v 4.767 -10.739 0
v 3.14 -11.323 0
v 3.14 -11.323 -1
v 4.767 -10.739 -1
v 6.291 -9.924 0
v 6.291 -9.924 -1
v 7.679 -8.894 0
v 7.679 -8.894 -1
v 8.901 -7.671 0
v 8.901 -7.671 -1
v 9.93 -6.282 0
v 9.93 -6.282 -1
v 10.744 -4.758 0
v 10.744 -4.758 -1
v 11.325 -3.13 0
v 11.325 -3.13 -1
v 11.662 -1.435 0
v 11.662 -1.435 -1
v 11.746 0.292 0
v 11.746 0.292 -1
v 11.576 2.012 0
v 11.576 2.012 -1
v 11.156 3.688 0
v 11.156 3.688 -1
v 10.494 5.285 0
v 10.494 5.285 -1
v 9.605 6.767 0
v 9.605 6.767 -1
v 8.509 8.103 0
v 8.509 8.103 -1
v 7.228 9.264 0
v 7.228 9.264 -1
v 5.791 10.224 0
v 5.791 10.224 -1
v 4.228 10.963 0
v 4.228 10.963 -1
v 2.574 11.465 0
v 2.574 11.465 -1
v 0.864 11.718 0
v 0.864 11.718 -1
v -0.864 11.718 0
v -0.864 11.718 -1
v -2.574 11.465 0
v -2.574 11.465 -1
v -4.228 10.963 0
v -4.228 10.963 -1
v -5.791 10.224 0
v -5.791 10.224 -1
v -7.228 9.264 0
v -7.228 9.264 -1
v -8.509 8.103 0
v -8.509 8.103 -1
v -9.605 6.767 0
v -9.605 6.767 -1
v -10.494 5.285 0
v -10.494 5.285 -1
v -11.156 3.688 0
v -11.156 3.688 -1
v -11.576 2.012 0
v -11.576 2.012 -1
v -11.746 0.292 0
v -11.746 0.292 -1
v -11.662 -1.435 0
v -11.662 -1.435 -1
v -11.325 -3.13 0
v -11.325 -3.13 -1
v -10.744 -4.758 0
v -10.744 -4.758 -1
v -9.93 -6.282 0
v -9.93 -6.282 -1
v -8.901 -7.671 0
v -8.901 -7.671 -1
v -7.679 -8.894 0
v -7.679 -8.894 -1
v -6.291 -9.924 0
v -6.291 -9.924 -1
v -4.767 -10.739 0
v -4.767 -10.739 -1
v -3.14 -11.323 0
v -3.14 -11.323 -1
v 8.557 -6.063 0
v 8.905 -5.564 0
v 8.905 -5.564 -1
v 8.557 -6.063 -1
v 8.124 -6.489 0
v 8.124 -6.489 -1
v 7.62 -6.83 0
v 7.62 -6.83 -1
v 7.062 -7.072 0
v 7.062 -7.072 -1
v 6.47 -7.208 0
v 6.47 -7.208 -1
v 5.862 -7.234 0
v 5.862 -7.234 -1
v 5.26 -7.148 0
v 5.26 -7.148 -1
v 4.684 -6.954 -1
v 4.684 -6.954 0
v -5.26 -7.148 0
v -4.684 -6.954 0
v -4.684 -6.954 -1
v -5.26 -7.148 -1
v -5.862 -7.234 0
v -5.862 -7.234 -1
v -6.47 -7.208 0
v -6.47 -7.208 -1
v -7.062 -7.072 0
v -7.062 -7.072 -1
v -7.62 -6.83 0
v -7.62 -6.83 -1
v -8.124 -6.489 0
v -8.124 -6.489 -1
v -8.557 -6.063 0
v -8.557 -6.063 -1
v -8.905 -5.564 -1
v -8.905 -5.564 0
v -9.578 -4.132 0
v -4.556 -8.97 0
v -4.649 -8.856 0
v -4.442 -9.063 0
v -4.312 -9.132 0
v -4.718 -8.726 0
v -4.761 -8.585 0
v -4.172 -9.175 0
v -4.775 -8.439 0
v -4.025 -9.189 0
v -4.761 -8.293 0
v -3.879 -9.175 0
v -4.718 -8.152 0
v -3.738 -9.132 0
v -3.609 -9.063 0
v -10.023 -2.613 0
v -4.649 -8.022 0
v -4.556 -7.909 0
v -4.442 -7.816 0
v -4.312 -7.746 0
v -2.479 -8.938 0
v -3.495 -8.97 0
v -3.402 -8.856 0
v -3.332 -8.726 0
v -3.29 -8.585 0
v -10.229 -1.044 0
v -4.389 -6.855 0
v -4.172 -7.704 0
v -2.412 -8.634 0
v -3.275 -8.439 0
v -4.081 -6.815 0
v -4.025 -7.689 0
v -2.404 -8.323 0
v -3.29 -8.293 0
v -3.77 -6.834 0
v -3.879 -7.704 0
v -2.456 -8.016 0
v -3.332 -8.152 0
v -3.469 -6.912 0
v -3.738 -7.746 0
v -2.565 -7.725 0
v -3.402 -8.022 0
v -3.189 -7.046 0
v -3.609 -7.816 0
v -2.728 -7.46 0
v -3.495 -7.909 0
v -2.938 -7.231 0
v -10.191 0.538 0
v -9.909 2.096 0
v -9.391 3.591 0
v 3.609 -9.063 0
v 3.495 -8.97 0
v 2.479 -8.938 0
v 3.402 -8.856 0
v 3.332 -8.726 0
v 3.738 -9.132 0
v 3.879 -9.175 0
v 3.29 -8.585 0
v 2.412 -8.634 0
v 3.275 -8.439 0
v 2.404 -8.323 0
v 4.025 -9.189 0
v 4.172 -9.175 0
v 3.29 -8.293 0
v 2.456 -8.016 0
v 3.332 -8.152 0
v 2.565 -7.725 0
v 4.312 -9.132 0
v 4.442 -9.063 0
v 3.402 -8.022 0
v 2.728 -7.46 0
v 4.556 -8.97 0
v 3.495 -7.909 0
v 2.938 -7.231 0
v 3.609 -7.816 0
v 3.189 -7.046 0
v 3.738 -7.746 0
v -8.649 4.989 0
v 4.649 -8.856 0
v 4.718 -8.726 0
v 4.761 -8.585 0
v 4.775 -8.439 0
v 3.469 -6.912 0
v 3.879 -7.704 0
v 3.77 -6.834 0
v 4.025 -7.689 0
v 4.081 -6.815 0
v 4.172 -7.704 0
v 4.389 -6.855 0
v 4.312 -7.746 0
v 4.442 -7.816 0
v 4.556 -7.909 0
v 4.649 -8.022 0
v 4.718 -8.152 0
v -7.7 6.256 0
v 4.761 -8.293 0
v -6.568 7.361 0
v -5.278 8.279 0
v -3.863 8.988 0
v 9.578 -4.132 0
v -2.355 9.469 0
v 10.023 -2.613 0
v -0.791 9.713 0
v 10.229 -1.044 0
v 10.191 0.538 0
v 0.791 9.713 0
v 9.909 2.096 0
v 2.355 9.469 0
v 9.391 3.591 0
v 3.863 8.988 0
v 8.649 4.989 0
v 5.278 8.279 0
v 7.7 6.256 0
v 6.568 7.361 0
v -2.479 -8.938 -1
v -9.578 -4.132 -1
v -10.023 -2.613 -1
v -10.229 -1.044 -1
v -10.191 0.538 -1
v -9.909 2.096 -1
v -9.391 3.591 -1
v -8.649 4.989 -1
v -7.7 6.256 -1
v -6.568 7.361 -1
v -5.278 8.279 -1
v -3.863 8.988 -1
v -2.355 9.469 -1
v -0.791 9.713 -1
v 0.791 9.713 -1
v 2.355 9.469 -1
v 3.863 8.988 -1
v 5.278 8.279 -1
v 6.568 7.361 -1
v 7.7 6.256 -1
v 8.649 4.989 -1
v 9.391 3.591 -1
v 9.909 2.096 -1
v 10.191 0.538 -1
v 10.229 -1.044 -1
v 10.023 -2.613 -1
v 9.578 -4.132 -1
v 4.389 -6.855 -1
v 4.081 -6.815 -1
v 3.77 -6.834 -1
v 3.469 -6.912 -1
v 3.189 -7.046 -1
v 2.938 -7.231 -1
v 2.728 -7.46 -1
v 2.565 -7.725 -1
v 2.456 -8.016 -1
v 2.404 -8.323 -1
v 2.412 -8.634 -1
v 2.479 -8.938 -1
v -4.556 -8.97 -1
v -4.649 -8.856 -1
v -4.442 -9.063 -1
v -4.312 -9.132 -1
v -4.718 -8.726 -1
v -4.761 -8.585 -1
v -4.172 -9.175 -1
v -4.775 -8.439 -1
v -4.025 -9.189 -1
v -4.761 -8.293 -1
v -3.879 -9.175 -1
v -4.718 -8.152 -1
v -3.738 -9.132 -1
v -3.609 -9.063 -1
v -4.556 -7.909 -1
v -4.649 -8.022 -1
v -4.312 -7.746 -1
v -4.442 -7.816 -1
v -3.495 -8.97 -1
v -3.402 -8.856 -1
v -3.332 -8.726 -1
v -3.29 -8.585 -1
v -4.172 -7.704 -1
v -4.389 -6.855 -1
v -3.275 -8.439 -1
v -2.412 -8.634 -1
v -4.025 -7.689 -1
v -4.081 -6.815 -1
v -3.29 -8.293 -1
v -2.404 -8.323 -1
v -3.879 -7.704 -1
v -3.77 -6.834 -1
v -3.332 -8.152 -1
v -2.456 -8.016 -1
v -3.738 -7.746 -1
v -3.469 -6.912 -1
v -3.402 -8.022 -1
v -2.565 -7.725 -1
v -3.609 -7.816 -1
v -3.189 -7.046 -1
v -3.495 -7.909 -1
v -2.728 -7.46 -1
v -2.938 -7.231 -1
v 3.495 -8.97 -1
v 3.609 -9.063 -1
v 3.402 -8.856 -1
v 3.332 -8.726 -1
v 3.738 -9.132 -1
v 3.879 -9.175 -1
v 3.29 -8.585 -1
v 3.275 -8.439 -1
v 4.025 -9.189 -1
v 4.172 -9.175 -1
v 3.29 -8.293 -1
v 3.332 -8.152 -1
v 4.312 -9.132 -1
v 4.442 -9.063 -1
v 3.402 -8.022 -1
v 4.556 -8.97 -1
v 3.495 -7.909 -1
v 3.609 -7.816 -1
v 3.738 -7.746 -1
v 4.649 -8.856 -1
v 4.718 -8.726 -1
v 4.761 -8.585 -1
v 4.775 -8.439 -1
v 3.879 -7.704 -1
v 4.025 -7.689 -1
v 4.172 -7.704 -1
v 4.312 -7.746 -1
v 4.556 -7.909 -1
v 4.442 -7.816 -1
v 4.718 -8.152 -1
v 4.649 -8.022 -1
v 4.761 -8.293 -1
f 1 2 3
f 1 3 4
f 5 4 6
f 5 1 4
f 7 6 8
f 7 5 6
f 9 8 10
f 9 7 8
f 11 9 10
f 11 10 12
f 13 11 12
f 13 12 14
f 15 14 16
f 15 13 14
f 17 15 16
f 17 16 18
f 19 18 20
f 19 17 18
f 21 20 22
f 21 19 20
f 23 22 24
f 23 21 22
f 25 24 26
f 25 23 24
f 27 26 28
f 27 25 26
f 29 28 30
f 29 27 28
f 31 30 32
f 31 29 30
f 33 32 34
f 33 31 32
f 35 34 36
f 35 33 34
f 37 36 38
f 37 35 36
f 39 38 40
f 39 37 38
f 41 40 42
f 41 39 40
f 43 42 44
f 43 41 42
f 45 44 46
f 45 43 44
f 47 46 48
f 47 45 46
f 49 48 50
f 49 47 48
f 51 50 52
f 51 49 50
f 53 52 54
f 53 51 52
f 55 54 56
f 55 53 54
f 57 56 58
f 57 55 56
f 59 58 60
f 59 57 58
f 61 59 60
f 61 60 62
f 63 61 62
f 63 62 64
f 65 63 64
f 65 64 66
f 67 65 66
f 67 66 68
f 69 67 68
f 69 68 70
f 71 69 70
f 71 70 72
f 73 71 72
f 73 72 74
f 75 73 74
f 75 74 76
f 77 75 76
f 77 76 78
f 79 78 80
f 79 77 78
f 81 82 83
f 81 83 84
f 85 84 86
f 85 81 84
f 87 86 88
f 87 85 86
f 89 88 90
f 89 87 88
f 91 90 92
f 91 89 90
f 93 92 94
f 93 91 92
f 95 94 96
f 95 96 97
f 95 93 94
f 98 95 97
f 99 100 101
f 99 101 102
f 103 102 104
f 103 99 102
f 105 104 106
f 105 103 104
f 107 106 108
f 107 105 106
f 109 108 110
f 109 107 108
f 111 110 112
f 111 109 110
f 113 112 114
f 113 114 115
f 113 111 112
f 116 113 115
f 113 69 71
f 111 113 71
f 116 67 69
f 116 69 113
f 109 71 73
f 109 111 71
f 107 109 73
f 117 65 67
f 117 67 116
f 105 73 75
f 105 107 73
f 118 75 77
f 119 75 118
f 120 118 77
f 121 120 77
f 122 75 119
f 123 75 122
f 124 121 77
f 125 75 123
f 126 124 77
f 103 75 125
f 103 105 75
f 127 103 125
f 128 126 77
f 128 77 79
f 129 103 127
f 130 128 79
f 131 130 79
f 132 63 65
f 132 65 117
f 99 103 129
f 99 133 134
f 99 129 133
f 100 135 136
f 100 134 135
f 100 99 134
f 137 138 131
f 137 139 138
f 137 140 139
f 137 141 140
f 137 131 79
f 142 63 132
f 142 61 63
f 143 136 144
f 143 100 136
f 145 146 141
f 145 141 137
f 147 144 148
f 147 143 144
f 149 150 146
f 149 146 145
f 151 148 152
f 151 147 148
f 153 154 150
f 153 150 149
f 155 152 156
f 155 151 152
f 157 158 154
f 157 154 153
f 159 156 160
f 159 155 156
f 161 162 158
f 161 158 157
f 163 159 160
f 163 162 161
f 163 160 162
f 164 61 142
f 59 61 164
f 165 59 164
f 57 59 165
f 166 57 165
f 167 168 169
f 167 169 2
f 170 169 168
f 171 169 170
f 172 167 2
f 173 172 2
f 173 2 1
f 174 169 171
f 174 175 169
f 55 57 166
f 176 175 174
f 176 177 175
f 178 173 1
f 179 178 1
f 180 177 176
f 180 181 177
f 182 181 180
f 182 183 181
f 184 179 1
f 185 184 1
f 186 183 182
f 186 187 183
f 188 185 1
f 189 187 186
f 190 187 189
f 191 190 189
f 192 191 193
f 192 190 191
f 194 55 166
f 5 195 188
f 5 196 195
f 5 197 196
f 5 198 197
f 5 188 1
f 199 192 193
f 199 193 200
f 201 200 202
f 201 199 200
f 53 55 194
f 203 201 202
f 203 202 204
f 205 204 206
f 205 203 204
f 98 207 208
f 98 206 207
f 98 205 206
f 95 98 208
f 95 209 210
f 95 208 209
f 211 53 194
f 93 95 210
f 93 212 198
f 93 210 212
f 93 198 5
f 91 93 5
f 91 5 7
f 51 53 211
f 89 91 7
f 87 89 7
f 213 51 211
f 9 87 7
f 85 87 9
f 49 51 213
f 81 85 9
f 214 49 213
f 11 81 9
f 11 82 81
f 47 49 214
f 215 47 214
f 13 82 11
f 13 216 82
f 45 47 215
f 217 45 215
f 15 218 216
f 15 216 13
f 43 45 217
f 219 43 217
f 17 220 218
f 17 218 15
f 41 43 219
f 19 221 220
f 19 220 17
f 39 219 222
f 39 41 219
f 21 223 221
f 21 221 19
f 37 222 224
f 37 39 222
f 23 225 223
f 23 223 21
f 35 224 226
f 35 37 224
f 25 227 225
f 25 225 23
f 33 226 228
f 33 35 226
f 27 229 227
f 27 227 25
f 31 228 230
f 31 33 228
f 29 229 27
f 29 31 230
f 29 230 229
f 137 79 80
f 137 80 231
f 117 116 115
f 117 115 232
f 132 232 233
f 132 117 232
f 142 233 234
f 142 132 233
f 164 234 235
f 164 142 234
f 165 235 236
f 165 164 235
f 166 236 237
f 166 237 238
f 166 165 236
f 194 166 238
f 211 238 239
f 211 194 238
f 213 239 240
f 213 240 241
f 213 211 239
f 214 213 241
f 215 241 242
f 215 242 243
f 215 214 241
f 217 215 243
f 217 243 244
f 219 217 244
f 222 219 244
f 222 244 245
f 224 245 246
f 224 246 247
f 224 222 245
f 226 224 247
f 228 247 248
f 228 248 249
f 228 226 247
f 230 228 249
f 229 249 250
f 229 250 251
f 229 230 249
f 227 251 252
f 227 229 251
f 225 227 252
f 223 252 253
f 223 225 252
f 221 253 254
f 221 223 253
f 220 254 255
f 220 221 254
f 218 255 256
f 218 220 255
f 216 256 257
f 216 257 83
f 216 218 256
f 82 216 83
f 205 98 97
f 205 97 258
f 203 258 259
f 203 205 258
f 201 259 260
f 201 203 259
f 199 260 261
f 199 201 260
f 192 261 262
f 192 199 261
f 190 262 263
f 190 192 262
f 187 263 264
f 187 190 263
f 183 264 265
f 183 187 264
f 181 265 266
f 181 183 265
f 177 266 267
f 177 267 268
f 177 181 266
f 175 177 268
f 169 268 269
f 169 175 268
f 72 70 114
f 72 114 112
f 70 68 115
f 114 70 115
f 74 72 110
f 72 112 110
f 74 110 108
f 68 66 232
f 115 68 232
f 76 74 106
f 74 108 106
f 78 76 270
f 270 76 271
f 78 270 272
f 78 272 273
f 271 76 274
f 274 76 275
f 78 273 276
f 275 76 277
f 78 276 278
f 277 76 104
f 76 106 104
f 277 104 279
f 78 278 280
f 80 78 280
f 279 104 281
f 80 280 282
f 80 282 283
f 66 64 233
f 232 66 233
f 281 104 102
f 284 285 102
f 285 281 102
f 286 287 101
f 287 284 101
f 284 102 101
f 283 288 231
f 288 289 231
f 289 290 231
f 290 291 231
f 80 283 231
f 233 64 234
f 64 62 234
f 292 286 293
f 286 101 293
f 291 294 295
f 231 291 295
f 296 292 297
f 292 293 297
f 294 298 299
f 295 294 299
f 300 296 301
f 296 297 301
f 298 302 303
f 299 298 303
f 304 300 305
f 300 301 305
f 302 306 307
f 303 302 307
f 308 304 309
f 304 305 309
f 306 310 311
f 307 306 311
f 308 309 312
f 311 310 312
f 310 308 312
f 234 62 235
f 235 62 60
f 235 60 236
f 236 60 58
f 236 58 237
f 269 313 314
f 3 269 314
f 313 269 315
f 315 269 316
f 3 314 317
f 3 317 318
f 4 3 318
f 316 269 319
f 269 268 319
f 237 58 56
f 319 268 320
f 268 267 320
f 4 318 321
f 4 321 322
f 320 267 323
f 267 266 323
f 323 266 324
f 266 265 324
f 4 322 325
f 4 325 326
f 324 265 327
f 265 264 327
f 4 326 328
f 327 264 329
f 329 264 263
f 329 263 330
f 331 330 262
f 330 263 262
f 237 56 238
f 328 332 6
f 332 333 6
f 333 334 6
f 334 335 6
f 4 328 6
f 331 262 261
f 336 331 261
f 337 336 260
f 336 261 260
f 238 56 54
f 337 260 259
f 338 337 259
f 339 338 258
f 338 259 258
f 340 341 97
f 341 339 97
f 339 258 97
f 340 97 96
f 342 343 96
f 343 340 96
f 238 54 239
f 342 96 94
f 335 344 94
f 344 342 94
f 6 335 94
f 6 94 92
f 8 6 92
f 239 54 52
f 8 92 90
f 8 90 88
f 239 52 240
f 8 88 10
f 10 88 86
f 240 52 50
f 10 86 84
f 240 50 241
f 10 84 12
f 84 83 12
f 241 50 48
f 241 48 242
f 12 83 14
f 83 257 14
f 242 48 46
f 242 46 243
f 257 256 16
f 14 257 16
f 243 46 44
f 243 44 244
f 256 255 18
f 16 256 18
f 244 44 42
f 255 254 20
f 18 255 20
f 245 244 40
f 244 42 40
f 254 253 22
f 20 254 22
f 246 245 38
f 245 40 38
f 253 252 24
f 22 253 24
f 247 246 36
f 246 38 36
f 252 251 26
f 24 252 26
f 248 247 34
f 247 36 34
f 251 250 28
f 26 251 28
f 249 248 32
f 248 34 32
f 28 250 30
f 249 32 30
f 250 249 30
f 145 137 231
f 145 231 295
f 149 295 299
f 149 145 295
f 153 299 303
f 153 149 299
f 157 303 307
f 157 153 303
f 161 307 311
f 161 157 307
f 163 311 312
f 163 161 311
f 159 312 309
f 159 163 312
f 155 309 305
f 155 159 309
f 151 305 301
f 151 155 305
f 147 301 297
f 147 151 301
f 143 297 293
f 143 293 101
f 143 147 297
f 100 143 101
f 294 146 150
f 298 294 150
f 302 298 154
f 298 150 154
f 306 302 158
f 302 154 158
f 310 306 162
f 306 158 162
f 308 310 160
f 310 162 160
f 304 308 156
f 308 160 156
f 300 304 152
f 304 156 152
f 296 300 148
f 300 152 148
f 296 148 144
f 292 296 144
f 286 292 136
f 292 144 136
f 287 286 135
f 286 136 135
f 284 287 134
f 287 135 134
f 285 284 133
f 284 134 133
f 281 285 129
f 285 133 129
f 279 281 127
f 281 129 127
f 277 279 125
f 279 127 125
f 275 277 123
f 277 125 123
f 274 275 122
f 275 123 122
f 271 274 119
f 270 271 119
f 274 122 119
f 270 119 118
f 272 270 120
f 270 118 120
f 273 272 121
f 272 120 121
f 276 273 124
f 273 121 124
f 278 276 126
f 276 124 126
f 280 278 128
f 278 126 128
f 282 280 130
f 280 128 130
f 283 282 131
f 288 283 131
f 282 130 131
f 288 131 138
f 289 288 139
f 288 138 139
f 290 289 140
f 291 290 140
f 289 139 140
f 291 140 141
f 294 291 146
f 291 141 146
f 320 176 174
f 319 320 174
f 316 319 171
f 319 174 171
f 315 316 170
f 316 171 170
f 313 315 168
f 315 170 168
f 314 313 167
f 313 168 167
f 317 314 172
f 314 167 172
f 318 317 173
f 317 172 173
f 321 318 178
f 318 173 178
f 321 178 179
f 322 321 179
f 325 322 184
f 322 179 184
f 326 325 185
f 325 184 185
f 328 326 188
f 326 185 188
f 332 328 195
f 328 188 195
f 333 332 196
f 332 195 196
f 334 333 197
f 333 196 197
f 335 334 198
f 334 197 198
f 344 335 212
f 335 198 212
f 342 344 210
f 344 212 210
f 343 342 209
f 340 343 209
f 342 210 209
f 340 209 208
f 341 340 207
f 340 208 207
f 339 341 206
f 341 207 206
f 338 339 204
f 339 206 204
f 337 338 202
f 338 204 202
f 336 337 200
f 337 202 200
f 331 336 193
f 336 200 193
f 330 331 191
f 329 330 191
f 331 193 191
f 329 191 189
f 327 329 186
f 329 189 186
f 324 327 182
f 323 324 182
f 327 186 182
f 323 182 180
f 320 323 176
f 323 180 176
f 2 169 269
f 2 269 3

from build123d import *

# Parameters (mm, degrees)
SKETCH1_R          = 0.75
BASE_FLANGE1_DEPTH = 1


# Sheet-metal steps are written as plain solids
with BuildPart() as part:
    # Sketch1 → Base-Flange1 (new body)
    with BuildSketch(Plane.XY):
        with BuildLine():
            Line((-3.140050919, -11.322657825), (-2.47867317, -8.937806709))
            ThreePointArc((-2.47867317, -8.937806709), (-2.938495148, -7.231063808), (-4.684207754, -6.95376419))
            ThreePointArc((-4.684207754, -6.95376419), (-7.062092174, -7.07208067), (-8.90450501, -5.564152274))
            ThreePointArc((-8.90450501, -5.564152274), (0, 9.743819977), (8.90450501, -5.564152274))
            ThreePointArc((8.90450501, -5.564152274), (7.062092174, -7.07208067), (4.684207754, -6.95376419))
            ThreePointArc((4.684207754, -6.95376419), (2.938495148, -7.231063808), (2.47867317, -8.937806709))
            Line((2.47867317, -8.937806709), (3.140050919, -11.322657825))
            ThreePointArc((3.140050919, -11.322657825), (0, 11.75), (-3.140050919, -11.322657825))
        make_face()
        with Locations((-4.025278755, -8.439172409)):
            Circle(SKETCH1_R, mode=Mode.SUBTRACT)
        with Locations(Location((4.025278755, -8.439172409, 0), (0, 0, 180))):
            Circle(SKETCH1_R, mode=Mode.SUBTRACT)
    extrude(amount=-BASE_FLANGE1_DEPTH)


solid = part.part
